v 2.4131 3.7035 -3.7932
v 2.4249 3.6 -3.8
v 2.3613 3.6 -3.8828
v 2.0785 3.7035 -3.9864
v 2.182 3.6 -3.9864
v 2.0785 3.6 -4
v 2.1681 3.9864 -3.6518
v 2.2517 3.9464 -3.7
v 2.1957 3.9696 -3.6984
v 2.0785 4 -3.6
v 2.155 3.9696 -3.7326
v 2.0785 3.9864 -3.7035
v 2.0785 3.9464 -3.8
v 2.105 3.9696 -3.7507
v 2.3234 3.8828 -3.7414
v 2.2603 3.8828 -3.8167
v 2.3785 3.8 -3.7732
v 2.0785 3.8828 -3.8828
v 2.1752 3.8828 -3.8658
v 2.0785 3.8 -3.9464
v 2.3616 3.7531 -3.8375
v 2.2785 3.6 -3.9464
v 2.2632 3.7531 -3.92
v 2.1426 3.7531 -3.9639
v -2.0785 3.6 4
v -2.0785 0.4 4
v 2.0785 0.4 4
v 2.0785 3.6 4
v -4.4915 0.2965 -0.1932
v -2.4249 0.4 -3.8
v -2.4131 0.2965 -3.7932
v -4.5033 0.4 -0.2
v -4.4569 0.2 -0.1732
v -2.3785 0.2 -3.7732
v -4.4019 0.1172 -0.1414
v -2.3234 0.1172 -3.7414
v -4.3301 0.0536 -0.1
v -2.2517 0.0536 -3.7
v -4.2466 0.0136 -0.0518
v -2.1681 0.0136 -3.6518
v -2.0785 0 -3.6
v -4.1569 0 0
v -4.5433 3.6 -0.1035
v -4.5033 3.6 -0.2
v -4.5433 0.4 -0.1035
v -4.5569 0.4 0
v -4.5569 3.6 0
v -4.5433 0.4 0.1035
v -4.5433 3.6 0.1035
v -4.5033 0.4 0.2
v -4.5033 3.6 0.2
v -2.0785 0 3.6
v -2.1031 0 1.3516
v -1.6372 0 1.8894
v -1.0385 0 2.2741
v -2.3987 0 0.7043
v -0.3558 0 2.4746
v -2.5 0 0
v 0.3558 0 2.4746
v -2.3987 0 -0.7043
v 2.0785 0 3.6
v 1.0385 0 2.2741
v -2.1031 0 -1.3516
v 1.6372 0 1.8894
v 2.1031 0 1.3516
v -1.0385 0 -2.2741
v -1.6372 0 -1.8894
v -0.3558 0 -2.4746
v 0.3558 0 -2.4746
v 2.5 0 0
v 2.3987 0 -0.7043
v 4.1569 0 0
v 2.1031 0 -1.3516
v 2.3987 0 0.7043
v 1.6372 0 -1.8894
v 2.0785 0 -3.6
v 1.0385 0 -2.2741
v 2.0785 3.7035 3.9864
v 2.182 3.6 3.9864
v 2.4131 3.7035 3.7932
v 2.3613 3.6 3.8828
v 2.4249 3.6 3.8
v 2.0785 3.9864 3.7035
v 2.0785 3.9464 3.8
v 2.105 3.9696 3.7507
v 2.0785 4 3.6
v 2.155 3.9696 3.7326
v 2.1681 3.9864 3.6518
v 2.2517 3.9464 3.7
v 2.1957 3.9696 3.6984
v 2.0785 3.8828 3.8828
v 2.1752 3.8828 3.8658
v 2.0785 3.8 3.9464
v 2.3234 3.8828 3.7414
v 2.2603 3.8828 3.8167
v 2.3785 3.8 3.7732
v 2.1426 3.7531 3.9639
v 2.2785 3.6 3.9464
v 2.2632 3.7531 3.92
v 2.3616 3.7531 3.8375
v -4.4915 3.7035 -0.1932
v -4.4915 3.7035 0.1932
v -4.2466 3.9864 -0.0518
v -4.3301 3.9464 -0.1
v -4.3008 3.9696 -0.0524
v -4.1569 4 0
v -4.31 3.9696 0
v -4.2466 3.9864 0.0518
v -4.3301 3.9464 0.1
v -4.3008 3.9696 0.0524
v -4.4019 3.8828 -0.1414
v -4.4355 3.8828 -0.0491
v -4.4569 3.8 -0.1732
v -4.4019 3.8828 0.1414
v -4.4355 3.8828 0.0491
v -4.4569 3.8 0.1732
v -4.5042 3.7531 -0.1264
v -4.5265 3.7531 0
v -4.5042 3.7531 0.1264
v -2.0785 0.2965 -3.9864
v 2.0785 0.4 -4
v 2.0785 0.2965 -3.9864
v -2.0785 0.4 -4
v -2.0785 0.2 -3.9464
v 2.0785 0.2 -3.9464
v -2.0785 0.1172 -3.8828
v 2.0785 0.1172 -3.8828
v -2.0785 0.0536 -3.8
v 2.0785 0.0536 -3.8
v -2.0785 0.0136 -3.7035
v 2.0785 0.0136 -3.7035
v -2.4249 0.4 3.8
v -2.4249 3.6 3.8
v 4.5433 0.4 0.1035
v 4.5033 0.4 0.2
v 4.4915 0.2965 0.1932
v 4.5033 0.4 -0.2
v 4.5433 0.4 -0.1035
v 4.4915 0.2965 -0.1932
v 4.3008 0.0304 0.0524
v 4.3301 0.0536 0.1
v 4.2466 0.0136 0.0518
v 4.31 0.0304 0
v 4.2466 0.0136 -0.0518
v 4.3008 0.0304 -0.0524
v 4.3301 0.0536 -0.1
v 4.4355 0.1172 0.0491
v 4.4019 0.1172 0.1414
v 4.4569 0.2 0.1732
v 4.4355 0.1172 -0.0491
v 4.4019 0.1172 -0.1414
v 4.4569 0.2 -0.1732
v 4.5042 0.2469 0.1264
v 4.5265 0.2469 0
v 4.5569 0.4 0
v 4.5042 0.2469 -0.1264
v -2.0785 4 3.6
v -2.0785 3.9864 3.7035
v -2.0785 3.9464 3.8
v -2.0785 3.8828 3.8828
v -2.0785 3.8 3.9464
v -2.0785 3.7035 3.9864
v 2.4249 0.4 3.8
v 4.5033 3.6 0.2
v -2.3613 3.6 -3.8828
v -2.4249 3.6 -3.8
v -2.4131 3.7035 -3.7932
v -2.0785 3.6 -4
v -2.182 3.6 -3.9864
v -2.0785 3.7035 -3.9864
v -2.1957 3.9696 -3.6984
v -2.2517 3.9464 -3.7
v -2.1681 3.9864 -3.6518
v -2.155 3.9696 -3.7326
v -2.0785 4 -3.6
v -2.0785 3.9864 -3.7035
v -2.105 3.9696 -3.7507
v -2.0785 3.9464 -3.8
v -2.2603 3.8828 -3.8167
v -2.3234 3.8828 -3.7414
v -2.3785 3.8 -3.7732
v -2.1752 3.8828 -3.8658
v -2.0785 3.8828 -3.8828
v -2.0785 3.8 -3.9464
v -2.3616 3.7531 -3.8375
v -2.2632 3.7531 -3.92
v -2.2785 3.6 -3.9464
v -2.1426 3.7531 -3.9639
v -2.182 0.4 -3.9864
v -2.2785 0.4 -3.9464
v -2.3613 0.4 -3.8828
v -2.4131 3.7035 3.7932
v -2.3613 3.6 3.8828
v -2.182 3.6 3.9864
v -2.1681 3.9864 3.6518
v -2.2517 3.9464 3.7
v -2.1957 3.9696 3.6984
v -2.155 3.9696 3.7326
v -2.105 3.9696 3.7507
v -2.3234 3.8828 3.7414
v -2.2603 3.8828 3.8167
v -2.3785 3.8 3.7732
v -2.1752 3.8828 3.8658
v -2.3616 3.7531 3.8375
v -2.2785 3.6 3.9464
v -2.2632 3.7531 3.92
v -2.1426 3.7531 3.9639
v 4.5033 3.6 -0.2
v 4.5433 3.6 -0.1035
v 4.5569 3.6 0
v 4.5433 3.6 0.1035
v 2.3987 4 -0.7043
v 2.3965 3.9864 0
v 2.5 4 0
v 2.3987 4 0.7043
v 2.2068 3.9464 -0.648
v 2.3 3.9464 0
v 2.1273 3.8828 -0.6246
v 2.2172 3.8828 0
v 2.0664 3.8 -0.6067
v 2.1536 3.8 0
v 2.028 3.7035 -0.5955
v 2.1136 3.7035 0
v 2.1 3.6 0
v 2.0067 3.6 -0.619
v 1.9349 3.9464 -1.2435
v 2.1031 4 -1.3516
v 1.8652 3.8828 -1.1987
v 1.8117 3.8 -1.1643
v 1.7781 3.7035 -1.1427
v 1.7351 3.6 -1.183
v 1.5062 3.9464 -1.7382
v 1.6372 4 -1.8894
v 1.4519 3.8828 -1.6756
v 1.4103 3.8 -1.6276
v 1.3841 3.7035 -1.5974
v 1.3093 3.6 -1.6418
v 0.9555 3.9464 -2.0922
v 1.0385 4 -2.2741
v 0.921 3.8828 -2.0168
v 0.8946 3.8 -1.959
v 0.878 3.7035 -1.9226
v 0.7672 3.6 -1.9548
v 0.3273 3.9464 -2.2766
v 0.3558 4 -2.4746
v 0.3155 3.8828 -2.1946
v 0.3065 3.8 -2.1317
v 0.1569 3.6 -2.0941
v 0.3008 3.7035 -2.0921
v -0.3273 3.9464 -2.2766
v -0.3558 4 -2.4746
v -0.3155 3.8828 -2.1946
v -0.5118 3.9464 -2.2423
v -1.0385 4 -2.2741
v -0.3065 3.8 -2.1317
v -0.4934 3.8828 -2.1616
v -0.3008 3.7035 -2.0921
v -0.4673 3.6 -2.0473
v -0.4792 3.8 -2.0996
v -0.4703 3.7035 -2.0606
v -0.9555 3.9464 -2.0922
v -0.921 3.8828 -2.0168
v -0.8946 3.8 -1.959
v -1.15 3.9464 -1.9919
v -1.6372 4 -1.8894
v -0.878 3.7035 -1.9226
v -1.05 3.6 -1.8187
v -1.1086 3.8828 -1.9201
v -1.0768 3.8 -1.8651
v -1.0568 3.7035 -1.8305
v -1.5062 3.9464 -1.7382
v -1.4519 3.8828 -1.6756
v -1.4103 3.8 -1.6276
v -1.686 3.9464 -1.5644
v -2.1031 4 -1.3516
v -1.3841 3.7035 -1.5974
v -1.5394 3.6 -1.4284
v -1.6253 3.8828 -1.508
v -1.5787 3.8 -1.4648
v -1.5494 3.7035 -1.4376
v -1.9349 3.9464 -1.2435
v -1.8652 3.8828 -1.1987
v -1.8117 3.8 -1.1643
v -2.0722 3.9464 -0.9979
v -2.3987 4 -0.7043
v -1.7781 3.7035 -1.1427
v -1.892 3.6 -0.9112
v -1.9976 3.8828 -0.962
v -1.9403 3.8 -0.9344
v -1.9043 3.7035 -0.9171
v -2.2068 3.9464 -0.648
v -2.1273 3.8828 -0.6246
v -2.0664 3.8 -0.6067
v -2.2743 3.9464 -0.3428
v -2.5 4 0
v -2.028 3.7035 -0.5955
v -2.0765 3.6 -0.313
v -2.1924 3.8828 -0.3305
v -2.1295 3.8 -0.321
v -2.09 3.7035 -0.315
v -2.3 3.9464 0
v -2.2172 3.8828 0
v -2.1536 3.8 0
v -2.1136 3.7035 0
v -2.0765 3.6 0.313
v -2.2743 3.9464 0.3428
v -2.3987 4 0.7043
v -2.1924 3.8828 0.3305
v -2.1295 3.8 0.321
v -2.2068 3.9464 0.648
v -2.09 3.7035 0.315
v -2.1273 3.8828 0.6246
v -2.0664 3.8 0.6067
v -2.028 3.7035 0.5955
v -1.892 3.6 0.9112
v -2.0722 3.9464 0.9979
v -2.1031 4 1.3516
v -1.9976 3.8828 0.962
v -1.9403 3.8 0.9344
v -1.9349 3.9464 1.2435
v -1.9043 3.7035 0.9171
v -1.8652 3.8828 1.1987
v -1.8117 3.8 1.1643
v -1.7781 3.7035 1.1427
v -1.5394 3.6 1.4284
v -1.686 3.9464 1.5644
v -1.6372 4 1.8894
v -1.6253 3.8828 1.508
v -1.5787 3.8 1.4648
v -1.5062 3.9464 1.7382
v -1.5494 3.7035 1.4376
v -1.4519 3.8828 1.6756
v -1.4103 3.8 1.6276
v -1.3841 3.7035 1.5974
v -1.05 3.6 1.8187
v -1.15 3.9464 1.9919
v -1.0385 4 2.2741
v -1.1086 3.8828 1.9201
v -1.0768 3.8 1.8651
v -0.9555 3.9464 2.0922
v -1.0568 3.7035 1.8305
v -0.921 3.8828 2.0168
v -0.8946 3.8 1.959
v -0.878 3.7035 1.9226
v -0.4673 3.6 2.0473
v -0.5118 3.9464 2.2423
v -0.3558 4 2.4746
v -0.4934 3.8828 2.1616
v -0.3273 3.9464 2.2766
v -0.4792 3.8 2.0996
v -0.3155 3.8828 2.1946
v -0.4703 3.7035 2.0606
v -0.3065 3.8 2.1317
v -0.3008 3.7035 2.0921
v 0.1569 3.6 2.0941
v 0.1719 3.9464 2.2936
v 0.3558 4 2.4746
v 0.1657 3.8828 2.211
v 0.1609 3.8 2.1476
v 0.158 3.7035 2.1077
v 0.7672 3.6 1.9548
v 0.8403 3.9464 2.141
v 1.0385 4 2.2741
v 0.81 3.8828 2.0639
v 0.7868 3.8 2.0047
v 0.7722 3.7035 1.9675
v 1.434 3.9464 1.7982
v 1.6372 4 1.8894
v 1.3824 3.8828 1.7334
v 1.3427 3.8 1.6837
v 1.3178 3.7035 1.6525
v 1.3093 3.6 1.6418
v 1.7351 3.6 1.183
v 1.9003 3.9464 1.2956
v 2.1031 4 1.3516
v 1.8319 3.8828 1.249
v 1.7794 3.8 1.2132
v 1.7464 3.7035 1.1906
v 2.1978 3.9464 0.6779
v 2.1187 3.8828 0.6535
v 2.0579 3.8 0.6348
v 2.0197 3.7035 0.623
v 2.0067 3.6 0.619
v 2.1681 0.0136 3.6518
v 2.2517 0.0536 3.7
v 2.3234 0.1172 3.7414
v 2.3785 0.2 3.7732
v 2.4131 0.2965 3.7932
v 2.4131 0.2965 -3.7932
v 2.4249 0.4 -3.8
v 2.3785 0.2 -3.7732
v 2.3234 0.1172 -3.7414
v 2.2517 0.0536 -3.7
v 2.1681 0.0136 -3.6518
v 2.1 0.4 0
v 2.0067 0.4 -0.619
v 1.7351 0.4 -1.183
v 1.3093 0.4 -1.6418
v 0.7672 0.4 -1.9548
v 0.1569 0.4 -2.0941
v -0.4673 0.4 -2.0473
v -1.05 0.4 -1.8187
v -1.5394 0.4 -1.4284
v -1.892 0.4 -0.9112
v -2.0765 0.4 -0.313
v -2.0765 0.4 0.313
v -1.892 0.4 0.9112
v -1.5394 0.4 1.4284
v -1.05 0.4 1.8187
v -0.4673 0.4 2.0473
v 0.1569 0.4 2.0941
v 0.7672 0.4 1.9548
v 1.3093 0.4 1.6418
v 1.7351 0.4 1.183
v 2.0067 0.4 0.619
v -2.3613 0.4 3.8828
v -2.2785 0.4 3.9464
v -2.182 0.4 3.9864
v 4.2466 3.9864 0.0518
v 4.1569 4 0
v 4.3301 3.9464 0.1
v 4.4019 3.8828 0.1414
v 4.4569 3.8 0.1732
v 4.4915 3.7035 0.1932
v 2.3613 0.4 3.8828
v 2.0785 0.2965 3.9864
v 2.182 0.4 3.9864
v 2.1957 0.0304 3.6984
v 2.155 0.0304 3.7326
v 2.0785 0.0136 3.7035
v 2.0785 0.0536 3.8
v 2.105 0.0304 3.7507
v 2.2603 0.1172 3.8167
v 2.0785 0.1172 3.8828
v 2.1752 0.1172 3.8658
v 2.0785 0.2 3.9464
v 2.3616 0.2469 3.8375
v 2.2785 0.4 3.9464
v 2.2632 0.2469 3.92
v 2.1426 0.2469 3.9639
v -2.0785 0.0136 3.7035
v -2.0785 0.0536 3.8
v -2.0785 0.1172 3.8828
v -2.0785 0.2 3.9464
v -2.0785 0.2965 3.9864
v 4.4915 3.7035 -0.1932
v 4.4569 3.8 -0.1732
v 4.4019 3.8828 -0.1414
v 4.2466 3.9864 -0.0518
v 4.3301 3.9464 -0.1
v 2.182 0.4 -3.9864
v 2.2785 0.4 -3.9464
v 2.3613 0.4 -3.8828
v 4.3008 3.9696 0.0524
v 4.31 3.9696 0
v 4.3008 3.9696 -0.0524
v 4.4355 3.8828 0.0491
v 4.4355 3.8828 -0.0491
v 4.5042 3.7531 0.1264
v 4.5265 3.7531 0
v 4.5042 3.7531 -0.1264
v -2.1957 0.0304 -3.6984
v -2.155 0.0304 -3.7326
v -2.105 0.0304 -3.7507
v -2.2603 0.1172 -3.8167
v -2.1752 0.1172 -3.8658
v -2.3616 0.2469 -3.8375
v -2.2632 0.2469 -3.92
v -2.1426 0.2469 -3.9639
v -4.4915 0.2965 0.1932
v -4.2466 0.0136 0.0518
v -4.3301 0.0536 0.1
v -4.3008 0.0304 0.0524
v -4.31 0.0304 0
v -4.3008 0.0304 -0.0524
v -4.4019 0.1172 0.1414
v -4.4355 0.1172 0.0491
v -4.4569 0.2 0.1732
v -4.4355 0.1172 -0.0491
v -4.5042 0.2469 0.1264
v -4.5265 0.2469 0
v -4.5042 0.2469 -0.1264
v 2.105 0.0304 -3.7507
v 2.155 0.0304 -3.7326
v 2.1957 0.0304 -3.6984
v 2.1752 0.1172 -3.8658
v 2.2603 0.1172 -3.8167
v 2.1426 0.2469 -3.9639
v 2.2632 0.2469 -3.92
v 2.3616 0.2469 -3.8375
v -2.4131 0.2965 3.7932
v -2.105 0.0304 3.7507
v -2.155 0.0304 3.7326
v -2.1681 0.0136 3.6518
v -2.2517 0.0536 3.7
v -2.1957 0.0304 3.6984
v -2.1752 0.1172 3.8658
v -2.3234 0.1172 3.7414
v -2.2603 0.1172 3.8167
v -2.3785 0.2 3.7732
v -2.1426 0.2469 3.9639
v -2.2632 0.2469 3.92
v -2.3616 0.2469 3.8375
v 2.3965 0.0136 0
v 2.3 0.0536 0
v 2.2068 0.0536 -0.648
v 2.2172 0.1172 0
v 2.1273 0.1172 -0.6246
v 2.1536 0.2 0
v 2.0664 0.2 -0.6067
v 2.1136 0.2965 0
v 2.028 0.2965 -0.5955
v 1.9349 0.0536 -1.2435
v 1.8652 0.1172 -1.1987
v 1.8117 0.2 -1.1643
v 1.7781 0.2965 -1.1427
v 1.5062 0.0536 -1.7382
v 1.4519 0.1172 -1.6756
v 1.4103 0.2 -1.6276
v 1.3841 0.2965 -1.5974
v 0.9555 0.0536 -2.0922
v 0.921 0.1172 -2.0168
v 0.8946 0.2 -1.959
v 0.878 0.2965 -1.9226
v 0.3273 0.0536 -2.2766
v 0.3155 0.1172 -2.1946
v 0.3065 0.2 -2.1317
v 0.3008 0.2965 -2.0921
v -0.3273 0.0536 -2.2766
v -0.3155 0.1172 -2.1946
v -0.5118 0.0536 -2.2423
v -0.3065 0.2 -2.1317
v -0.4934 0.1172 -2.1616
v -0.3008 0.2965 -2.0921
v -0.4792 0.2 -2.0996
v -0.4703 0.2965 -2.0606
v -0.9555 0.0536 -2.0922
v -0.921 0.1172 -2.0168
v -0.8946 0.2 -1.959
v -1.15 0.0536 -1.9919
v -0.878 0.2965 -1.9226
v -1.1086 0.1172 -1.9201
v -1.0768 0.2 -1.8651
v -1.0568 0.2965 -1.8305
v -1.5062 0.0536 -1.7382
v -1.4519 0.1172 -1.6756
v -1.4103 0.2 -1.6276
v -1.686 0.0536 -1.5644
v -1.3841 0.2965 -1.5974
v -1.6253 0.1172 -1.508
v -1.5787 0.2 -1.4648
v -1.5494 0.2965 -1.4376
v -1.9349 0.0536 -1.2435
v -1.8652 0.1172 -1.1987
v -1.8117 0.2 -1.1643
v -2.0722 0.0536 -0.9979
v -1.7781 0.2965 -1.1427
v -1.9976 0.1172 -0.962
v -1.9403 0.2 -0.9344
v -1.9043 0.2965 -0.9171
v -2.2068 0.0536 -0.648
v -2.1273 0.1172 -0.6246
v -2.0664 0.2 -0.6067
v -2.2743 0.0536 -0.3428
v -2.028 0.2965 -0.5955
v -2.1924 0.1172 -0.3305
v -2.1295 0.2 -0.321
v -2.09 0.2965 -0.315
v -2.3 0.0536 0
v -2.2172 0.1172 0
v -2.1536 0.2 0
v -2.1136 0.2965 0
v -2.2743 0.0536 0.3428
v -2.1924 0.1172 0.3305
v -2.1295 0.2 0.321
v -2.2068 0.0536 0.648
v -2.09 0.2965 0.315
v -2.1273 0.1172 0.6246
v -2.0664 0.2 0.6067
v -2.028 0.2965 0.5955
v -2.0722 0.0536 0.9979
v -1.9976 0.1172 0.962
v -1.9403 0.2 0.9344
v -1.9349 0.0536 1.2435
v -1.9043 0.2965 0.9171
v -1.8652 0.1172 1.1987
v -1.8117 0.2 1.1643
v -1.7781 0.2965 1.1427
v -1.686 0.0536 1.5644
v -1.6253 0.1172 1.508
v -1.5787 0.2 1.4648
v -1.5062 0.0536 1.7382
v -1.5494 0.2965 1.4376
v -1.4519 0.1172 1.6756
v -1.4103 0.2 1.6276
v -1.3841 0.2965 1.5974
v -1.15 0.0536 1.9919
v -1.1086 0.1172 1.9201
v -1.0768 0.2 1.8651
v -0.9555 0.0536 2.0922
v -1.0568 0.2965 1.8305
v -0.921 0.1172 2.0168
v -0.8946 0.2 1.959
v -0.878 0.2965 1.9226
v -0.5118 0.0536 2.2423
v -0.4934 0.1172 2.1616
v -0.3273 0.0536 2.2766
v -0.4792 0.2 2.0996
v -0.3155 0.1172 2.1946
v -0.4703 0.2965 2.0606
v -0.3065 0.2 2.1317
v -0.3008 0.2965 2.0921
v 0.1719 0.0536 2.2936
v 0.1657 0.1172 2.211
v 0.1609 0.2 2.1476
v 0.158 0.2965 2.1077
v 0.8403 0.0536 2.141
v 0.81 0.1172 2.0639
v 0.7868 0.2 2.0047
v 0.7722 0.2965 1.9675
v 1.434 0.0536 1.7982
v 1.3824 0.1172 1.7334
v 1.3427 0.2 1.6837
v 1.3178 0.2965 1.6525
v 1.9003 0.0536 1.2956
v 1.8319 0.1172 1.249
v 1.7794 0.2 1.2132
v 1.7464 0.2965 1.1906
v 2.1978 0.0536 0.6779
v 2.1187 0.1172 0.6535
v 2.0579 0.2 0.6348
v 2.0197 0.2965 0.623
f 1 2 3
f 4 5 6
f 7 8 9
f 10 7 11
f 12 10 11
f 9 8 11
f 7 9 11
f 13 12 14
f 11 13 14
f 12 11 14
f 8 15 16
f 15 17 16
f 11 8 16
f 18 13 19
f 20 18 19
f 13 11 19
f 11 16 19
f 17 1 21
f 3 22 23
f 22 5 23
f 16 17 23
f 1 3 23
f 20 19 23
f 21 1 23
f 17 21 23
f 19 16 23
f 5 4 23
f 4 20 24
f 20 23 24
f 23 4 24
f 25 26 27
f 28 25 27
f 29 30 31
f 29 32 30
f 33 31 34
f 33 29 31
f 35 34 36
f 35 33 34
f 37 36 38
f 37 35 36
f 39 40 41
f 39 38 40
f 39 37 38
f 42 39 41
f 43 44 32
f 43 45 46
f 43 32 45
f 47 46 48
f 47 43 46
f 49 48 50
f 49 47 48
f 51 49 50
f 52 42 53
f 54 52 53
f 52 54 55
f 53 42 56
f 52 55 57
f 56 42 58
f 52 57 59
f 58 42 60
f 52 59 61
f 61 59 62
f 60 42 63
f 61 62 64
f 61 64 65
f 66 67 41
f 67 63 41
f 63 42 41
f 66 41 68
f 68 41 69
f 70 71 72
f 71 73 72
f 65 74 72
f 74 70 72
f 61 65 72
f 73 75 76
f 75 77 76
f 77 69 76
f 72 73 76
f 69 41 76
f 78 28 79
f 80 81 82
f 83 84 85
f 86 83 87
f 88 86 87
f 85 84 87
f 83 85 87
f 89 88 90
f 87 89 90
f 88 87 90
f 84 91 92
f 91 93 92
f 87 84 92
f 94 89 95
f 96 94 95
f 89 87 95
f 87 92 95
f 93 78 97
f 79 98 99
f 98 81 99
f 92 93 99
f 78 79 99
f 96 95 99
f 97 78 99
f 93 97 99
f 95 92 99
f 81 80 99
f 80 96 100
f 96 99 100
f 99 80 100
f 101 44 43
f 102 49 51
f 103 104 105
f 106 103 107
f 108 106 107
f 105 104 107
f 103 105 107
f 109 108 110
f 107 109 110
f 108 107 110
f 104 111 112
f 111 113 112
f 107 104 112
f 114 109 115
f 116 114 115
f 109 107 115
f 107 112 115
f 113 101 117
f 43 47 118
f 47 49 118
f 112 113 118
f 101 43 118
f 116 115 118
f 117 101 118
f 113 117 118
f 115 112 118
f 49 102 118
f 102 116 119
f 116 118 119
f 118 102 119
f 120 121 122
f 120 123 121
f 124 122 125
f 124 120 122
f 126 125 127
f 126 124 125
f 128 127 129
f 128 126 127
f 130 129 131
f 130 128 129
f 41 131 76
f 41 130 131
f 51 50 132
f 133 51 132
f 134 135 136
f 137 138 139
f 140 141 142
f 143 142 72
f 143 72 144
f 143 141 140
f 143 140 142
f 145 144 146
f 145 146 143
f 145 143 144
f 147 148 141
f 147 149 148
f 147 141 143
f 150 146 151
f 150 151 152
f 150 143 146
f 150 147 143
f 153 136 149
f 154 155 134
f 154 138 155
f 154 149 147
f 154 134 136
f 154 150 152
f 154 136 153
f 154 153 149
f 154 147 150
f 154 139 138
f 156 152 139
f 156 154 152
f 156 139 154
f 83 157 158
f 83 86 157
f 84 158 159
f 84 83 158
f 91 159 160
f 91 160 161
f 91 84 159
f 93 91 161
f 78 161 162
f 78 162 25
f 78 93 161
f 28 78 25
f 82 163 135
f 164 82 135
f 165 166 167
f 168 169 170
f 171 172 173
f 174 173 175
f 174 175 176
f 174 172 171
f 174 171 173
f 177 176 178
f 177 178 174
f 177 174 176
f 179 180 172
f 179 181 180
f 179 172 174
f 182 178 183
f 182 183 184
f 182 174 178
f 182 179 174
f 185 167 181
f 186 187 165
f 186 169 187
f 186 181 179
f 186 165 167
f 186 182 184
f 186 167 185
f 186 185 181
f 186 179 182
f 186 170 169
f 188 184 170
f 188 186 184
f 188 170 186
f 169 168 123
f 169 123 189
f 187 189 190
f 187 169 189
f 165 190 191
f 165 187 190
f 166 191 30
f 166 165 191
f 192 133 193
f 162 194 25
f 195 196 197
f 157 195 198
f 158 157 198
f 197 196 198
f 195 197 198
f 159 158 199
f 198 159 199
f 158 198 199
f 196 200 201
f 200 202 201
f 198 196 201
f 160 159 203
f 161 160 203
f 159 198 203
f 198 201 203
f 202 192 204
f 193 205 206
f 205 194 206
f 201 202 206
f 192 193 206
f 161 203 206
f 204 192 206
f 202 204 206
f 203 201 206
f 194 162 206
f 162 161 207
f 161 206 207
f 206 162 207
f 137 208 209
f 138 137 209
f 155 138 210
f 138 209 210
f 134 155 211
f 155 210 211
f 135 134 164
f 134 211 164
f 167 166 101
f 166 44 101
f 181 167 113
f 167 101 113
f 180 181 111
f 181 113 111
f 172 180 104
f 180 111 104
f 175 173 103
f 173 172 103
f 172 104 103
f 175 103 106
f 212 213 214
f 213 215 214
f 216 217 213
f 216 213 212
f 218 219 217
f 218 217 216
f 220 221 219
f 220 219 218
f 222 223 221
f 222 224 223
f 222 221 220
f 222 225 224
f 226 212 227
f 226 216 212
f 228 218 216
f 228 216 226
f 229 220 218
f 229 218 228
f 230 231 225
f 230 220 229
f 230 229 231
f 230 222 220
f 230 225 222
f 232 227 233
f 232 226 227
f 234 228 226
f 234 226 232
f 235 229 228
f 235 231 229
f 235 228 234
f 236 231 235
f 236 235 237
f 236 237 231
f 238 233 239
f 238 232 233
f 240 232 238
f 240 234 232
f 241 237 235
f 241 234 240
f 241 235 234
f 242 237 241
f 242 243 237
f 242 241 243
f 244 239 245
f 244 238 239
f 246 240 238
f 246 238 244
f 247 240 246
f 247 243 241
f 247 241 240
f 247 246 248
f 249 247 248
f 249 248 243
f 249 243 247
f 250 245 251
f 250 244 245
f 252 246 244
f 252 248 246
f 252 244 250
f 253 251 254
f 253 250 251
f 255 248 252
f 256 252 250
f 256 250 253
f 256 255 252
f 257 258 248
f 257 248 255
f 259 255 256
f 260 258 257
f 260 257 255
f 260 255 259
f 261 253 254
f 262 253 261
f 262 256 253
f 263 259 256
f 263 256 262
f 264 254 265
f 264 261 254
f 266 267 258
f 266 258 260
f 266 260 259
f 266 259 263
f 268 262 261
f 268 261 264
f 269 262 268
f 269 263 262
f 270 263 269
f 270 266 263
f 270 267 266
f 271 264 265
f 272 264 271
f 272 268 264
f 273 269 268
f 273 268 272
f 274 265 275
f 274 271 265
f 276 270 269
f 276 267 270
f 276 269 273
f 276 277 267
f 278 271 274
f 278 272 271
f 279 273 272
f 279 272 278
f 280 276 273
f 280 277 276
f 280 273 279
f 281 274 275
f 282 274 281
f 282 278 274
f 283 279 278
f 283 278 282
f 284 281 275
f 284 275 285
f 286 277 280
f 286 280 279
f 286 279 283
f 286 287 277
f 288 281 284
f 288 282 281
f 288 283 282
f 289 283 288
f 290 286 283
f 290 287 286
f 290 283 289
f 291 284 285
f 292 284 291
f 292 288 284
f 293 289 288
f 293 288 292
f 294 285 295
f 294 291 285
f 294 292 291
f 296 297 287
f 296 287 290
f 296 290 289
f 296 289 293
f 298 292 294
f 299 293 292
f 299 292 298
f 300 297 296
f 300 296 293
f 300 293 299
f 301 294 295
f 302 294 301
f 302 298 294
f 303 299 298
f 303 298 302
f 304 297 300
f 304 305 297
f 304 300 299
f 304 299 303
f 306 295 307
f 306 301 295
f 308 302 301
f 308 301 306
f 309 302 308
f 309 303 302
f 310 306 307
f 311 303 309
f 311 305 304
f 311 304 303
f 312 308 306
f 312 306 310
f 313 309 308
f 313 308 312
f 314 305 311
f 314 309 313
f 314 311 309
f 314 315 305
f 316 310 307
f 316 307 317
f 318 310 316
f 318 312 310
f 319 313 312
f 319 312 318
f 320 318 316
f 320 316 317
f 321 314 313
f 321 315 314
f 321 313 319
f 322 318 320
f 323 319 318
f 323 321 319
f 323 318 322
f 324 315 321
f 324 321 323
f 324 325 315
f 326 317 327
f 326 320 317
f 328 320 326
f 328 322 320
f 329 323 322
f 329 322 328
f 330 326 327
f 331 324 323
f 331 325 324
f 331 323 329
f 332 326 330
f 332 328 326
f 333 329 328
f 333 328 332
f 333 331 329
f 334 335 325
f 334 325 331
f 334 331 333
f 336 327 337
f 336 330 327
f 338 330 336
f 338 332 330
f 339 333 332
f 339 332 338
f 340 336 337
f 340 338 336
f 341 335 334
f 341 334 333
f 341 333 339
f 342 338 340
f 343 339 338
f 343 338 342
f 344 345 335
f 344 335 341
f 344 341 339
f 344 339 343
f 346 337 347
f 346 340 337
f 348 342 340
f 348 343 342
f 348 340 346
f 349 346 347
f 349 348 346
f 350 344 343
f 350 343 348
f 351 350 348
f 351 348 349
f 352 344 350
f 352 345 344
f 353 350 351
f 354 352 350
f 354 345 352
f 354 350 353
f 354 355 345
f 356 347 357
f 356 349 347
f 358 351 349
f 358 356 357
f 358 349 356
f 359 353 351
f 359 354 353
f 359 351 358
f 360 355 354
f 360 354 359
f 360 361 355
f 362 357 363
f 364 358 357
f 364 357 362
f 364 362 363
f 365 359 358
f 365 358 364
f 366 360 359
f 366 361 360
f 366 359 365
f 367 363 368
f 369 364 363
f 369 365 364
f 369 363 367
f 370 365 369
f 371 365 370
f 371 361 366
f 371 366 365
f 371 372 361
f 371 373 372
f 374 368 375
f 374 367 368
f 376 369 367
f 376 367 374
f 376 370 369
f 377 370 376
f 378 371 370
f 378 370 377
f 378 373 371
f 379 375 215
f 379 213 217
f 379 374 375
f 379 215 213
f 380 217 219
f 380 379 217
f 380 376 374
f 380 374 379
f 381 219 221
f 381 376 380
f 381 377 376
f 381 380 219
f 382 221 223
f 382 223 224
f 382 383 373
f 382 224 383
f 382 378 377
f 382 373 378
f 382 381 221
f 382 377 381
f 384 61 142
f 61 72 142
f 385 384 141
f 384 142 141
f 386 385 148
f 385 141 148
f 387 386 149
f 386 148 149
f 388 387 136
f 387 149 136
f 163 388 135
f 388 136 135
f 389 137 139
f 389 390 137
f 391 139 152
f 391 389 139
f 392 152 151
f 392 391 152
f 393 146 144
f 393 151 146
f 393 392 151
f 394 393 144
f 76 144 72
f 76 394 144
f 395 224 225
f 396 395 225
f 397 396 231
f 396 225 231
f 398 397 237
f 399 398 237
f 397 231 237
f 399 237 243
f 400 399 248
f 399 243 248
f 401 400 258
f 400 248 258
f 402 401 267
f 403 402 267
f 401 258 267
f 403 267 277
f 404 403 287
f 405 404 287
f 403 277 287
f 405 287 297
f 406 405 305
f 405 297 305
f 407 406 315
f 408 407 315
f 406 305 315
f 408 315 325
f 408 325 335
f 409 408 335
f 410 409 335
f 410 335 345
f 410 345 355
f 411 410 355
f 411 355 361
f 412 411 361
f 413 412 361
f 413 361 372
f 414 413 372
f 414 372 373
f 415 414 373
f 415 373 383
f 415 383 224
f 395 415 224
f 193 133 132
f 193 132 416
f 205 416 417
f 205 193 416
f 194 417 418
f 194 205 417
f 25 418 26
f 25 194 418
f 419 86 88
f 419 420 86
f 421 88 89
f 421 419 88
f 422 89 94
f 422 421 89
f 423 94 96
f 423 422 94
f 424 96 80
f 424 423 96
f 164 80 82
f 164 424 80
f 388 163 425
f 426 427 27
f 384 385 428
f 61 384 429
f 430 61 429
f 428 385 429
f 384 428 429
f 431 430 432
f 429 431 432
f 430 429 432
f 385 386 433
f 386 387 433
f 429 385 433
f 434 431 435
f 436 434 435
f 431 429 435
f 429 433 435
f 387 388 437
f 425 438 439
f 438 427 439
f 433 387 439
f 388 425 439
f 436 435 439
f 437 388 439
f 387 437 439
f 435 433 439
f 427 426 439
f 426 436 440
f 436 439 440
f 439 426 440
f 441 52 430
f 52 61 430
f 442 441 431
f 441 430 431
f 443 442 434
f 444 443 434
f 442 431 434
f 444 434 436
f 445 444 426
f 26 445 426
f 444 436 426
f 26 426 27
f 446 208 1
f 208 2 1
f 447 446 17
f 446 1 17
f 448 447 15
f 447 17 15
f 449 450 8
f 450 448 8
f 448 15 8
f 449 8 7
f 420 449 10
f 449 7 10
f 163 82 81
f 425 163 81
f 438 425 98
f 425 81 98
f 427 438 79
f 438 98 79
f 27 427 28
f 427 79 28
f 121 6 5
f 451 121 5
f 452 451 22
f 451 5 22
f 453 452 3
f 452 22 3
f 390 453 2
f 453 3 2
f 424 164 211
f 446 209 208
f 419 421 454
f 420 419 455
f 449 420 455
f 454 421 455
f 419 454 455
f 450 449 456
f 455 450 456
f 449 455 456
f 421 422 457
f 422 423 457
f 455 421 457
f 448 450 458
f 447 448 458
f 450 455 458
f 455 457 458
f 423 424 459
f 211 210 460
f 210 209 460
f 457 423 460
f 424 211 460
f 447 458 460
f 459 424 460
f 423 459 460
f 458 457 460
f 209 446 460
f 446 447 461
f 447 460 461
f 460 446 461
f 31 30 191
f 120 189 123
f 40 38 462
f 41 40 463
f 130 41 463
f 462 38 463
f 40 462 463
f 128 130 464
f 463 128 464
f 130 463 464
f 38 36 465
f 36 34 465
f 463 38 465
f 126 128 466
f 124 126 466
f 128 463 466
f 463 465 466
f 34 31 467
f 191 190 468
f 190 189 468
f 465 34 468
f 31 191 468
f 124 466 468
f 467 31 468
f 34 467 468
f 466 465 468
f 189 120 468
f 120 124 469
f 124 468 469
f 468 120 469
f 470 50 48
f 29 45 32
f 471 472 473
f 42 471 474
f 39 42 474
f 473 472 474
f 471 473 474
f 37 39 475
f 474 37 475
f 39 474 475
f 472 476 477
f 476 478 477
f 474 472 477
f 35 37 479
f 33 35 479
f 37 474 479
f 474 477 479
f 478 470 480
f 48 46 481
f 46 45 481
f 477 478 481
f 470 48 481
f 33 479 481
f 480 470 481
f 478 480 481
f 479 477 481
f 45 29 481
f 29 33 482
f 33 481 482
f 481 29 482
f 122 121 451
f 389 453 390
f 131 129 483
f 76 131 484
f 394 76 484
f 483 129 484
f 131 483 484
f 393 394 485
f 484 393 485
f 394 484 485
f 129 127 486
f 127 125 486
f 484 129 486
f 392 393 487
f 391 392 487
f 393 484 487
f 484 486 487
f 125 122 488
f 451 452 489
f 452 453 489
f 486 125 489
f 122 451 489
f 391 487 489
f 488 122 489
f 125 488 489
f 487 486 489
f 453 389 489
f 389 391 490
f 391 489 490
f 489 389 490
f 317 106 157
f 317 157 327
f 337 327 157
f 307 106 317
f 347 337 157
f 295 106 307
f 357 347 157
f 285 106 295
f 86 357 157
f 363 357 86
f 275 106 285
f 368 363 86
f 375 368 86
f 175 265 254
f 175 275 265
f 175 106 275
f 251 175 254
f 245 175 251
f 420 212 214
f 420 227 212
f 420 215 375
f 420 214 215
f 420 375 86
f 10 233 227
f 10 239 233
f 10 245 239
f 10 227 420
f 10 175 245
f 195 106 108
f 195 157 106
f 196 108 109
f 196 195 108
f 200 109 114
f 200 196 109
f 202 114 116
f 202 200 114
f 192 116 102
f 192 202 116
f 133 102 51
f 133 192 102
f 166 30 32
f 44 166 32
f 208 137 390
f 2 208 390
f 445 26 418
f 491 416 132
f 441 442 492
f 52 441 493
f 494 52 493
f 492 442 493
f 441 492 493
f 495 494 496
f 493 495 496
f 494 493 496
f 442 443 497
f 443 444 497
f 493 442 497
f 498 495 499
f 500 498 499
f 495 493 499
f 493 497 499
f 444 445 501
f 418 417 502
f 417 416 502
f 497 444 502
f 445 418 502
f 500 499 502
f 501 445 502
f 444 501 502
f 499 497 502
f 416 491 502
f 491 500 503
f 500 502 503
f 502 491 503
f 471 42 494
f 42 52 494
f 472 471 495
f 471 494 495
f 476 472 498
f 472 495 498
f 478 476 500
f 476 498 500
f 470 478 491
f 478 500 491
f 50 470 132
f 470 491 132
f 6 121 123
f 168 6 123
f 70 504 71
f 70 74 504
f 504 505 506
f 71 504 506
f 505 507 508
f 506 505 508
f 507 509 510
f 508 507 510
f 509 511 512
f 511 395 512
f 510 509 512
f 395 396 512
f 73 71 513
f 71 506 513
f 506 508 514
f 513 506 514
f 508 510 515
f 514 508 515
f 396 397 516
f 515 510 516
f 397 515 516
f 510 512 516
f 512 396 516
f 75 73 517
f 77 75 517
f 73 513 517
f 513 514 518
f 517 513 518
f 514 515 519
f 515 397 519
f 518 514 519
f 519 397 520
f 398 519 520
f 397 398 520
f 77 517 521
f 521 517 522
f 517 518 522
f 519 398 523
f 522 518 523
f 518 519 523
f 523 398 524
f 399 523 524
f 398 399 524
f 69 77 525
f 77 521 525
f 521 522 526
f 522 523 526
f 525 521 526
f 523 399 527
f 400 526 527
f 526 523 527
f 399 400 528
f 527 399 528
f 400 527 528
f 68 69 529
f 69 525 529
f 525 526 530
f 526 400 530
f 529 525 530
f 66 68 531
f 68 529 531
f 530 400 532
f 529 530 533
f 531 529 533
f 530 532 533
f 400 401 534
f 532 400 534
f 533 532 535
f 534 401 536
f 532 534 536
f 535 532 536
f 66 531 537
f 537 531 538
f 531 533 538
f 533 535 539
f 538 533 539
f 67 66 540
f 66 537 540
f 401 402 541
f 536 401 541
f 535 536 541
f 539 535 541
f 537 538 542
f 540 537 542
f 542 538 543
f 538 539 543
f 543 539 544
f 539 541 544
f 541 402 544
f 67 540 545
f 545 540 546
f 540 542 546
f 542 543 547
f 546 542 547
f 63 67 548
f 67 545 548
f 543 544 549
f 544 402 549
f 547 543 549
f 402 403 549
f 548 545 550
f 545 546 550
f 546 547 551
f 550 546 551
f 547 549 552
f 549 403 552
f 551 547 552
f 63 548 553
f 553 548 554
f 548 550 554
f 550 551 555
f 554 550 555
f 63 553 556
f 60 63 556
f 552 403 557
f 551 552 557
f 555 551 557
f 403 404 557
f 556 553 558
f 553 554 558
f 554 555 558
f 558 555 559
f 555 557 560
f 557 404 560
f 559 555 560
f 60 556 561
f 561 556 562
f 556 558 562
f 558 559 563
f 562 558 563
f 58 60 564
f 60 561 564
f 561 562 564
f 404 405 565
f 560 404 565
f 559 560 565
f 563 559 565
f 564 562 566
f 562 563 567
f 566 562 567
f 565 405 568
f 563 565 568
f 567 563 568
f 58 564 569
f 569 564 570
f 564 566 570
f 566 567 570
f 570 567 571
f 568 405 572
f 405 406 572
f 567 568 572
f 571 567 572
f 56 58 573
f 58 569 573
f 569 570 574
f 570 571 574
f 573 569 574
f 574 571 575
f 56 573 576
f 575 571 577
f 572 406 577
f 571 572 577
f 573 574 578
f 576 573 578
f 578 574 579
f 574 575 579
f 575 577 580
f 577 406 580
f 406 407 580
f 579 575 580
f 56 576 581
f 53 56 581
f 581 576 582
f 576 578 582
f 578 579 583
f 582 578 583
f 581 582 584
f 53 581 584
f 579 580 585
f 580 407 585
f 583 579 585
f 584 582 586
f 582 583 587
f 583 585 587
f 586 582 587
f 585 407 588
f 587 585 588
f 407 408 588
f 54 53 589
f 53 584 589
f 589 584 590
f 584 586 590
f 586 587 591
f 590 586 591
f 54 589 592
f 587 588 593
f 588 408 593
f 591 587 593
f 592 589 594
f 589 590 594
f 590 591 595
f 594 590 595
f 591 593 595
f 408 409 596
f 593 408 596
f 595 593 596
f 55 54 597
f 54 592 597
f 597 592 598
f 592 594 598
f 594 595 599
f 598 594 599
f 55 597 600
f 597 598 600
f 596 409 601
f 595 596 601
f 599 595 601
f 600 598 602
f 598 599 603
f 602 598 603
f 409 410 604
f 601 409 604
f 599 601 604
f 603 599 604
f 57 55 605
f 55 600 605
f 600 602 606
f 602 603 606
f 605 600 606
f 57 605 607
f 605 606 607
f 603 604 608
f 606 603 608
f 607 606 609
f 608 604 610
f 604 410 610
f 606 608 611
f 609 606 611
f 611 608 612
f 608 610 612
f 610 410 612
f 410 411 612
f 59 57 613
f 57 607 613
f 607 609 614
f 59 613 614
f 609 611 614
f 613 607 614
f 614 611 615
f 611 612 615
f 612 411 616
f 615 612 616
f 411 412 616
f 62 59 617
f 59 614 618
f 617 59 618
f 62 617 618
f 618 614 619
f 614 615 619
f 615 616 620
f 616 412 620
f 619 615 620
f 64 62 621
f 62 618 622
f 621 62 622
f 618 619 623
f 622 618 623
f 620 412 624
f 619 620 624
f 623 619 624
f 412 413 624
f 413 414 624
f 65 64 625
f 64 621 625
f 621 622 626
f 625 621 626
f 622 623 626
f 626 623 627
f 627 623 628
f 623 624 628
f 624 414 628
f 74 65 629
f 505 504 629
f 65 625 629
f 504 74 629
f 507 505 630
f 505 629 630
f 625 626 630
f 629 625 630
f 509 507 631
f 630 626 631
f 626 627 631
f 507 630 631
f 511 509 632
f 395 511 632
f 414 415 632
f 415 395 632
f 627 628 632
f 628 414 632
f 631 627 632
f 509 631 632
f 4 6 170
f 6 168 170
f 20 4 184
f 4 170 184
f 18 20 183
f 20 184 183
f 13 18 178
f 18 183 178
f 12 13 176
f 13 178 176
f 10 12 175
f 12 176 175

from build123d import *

# Parameters (mm, degrees)
MAIN_BLOCK_DEPTH    = 4
M5_TAPPED_SECTION_D = 4.2
COSMETIC_FILLETS_R  = 0.4


with BuildPart() as part:
    # Main Block Sketch → Main Block (new body)
    with BuildSketch(Plane(origin=(0, 0, 0), x_dir=(1, 0, 0), z_dir=(0, 1, 0))):
        Polygon((2.309401077, 4), (-2.309401077, 4), (-4.618802154, 0), (-2.309401077, -4), (2.309401077, -4), (4.618802154, 0), align=None)
    extrude(amount=MAIN_BLOCK_DEPTH)

    # M5 Tapped section (through all)
    with Locations(Plane(origin=(0, 0, 0), x_dir=(-1, 0, 0), z_dir=(0, -1, 0))):
        with Locations((0, 0)):
            Hole(M5_TAPPED_SECTION_D / 2)

    # Cosmetic Fillets
    cosmetic_fillets_edges = [part.edges().sort_by_distance(p)[0] for p in [
        (4.618802154, 2, 0),
        (2.309401077, 2, 4),
        (-2.309401077, 2, 4),
        (-4.618802154, 2, 0),
        (-2.309401077, 2, -4),
        (2.309401077, 2, -4),
        (-3.464101615, 4, -2),
        (-3.464101615, 4, 2),
        (0, 4, 4),
        (-2.1, 0, 0),
        (-2.1, 4, 0),
        (3.464101615, 4, 2),
        (3.464101615, 4, -2),
        (3.464101615, 0, 2),
        (0, 0, 4),
        (-3.464101615, 0, 2),
        (-3.464101615, 0, -2),
        (0, 0, -4),
        (3.464101615, 0, -2),
        (0, 4, -4),
    ]]
    fillet(cosmetic_fillets_edges, radius=COSMETIC_FILLETS_R)


solid = part.part
